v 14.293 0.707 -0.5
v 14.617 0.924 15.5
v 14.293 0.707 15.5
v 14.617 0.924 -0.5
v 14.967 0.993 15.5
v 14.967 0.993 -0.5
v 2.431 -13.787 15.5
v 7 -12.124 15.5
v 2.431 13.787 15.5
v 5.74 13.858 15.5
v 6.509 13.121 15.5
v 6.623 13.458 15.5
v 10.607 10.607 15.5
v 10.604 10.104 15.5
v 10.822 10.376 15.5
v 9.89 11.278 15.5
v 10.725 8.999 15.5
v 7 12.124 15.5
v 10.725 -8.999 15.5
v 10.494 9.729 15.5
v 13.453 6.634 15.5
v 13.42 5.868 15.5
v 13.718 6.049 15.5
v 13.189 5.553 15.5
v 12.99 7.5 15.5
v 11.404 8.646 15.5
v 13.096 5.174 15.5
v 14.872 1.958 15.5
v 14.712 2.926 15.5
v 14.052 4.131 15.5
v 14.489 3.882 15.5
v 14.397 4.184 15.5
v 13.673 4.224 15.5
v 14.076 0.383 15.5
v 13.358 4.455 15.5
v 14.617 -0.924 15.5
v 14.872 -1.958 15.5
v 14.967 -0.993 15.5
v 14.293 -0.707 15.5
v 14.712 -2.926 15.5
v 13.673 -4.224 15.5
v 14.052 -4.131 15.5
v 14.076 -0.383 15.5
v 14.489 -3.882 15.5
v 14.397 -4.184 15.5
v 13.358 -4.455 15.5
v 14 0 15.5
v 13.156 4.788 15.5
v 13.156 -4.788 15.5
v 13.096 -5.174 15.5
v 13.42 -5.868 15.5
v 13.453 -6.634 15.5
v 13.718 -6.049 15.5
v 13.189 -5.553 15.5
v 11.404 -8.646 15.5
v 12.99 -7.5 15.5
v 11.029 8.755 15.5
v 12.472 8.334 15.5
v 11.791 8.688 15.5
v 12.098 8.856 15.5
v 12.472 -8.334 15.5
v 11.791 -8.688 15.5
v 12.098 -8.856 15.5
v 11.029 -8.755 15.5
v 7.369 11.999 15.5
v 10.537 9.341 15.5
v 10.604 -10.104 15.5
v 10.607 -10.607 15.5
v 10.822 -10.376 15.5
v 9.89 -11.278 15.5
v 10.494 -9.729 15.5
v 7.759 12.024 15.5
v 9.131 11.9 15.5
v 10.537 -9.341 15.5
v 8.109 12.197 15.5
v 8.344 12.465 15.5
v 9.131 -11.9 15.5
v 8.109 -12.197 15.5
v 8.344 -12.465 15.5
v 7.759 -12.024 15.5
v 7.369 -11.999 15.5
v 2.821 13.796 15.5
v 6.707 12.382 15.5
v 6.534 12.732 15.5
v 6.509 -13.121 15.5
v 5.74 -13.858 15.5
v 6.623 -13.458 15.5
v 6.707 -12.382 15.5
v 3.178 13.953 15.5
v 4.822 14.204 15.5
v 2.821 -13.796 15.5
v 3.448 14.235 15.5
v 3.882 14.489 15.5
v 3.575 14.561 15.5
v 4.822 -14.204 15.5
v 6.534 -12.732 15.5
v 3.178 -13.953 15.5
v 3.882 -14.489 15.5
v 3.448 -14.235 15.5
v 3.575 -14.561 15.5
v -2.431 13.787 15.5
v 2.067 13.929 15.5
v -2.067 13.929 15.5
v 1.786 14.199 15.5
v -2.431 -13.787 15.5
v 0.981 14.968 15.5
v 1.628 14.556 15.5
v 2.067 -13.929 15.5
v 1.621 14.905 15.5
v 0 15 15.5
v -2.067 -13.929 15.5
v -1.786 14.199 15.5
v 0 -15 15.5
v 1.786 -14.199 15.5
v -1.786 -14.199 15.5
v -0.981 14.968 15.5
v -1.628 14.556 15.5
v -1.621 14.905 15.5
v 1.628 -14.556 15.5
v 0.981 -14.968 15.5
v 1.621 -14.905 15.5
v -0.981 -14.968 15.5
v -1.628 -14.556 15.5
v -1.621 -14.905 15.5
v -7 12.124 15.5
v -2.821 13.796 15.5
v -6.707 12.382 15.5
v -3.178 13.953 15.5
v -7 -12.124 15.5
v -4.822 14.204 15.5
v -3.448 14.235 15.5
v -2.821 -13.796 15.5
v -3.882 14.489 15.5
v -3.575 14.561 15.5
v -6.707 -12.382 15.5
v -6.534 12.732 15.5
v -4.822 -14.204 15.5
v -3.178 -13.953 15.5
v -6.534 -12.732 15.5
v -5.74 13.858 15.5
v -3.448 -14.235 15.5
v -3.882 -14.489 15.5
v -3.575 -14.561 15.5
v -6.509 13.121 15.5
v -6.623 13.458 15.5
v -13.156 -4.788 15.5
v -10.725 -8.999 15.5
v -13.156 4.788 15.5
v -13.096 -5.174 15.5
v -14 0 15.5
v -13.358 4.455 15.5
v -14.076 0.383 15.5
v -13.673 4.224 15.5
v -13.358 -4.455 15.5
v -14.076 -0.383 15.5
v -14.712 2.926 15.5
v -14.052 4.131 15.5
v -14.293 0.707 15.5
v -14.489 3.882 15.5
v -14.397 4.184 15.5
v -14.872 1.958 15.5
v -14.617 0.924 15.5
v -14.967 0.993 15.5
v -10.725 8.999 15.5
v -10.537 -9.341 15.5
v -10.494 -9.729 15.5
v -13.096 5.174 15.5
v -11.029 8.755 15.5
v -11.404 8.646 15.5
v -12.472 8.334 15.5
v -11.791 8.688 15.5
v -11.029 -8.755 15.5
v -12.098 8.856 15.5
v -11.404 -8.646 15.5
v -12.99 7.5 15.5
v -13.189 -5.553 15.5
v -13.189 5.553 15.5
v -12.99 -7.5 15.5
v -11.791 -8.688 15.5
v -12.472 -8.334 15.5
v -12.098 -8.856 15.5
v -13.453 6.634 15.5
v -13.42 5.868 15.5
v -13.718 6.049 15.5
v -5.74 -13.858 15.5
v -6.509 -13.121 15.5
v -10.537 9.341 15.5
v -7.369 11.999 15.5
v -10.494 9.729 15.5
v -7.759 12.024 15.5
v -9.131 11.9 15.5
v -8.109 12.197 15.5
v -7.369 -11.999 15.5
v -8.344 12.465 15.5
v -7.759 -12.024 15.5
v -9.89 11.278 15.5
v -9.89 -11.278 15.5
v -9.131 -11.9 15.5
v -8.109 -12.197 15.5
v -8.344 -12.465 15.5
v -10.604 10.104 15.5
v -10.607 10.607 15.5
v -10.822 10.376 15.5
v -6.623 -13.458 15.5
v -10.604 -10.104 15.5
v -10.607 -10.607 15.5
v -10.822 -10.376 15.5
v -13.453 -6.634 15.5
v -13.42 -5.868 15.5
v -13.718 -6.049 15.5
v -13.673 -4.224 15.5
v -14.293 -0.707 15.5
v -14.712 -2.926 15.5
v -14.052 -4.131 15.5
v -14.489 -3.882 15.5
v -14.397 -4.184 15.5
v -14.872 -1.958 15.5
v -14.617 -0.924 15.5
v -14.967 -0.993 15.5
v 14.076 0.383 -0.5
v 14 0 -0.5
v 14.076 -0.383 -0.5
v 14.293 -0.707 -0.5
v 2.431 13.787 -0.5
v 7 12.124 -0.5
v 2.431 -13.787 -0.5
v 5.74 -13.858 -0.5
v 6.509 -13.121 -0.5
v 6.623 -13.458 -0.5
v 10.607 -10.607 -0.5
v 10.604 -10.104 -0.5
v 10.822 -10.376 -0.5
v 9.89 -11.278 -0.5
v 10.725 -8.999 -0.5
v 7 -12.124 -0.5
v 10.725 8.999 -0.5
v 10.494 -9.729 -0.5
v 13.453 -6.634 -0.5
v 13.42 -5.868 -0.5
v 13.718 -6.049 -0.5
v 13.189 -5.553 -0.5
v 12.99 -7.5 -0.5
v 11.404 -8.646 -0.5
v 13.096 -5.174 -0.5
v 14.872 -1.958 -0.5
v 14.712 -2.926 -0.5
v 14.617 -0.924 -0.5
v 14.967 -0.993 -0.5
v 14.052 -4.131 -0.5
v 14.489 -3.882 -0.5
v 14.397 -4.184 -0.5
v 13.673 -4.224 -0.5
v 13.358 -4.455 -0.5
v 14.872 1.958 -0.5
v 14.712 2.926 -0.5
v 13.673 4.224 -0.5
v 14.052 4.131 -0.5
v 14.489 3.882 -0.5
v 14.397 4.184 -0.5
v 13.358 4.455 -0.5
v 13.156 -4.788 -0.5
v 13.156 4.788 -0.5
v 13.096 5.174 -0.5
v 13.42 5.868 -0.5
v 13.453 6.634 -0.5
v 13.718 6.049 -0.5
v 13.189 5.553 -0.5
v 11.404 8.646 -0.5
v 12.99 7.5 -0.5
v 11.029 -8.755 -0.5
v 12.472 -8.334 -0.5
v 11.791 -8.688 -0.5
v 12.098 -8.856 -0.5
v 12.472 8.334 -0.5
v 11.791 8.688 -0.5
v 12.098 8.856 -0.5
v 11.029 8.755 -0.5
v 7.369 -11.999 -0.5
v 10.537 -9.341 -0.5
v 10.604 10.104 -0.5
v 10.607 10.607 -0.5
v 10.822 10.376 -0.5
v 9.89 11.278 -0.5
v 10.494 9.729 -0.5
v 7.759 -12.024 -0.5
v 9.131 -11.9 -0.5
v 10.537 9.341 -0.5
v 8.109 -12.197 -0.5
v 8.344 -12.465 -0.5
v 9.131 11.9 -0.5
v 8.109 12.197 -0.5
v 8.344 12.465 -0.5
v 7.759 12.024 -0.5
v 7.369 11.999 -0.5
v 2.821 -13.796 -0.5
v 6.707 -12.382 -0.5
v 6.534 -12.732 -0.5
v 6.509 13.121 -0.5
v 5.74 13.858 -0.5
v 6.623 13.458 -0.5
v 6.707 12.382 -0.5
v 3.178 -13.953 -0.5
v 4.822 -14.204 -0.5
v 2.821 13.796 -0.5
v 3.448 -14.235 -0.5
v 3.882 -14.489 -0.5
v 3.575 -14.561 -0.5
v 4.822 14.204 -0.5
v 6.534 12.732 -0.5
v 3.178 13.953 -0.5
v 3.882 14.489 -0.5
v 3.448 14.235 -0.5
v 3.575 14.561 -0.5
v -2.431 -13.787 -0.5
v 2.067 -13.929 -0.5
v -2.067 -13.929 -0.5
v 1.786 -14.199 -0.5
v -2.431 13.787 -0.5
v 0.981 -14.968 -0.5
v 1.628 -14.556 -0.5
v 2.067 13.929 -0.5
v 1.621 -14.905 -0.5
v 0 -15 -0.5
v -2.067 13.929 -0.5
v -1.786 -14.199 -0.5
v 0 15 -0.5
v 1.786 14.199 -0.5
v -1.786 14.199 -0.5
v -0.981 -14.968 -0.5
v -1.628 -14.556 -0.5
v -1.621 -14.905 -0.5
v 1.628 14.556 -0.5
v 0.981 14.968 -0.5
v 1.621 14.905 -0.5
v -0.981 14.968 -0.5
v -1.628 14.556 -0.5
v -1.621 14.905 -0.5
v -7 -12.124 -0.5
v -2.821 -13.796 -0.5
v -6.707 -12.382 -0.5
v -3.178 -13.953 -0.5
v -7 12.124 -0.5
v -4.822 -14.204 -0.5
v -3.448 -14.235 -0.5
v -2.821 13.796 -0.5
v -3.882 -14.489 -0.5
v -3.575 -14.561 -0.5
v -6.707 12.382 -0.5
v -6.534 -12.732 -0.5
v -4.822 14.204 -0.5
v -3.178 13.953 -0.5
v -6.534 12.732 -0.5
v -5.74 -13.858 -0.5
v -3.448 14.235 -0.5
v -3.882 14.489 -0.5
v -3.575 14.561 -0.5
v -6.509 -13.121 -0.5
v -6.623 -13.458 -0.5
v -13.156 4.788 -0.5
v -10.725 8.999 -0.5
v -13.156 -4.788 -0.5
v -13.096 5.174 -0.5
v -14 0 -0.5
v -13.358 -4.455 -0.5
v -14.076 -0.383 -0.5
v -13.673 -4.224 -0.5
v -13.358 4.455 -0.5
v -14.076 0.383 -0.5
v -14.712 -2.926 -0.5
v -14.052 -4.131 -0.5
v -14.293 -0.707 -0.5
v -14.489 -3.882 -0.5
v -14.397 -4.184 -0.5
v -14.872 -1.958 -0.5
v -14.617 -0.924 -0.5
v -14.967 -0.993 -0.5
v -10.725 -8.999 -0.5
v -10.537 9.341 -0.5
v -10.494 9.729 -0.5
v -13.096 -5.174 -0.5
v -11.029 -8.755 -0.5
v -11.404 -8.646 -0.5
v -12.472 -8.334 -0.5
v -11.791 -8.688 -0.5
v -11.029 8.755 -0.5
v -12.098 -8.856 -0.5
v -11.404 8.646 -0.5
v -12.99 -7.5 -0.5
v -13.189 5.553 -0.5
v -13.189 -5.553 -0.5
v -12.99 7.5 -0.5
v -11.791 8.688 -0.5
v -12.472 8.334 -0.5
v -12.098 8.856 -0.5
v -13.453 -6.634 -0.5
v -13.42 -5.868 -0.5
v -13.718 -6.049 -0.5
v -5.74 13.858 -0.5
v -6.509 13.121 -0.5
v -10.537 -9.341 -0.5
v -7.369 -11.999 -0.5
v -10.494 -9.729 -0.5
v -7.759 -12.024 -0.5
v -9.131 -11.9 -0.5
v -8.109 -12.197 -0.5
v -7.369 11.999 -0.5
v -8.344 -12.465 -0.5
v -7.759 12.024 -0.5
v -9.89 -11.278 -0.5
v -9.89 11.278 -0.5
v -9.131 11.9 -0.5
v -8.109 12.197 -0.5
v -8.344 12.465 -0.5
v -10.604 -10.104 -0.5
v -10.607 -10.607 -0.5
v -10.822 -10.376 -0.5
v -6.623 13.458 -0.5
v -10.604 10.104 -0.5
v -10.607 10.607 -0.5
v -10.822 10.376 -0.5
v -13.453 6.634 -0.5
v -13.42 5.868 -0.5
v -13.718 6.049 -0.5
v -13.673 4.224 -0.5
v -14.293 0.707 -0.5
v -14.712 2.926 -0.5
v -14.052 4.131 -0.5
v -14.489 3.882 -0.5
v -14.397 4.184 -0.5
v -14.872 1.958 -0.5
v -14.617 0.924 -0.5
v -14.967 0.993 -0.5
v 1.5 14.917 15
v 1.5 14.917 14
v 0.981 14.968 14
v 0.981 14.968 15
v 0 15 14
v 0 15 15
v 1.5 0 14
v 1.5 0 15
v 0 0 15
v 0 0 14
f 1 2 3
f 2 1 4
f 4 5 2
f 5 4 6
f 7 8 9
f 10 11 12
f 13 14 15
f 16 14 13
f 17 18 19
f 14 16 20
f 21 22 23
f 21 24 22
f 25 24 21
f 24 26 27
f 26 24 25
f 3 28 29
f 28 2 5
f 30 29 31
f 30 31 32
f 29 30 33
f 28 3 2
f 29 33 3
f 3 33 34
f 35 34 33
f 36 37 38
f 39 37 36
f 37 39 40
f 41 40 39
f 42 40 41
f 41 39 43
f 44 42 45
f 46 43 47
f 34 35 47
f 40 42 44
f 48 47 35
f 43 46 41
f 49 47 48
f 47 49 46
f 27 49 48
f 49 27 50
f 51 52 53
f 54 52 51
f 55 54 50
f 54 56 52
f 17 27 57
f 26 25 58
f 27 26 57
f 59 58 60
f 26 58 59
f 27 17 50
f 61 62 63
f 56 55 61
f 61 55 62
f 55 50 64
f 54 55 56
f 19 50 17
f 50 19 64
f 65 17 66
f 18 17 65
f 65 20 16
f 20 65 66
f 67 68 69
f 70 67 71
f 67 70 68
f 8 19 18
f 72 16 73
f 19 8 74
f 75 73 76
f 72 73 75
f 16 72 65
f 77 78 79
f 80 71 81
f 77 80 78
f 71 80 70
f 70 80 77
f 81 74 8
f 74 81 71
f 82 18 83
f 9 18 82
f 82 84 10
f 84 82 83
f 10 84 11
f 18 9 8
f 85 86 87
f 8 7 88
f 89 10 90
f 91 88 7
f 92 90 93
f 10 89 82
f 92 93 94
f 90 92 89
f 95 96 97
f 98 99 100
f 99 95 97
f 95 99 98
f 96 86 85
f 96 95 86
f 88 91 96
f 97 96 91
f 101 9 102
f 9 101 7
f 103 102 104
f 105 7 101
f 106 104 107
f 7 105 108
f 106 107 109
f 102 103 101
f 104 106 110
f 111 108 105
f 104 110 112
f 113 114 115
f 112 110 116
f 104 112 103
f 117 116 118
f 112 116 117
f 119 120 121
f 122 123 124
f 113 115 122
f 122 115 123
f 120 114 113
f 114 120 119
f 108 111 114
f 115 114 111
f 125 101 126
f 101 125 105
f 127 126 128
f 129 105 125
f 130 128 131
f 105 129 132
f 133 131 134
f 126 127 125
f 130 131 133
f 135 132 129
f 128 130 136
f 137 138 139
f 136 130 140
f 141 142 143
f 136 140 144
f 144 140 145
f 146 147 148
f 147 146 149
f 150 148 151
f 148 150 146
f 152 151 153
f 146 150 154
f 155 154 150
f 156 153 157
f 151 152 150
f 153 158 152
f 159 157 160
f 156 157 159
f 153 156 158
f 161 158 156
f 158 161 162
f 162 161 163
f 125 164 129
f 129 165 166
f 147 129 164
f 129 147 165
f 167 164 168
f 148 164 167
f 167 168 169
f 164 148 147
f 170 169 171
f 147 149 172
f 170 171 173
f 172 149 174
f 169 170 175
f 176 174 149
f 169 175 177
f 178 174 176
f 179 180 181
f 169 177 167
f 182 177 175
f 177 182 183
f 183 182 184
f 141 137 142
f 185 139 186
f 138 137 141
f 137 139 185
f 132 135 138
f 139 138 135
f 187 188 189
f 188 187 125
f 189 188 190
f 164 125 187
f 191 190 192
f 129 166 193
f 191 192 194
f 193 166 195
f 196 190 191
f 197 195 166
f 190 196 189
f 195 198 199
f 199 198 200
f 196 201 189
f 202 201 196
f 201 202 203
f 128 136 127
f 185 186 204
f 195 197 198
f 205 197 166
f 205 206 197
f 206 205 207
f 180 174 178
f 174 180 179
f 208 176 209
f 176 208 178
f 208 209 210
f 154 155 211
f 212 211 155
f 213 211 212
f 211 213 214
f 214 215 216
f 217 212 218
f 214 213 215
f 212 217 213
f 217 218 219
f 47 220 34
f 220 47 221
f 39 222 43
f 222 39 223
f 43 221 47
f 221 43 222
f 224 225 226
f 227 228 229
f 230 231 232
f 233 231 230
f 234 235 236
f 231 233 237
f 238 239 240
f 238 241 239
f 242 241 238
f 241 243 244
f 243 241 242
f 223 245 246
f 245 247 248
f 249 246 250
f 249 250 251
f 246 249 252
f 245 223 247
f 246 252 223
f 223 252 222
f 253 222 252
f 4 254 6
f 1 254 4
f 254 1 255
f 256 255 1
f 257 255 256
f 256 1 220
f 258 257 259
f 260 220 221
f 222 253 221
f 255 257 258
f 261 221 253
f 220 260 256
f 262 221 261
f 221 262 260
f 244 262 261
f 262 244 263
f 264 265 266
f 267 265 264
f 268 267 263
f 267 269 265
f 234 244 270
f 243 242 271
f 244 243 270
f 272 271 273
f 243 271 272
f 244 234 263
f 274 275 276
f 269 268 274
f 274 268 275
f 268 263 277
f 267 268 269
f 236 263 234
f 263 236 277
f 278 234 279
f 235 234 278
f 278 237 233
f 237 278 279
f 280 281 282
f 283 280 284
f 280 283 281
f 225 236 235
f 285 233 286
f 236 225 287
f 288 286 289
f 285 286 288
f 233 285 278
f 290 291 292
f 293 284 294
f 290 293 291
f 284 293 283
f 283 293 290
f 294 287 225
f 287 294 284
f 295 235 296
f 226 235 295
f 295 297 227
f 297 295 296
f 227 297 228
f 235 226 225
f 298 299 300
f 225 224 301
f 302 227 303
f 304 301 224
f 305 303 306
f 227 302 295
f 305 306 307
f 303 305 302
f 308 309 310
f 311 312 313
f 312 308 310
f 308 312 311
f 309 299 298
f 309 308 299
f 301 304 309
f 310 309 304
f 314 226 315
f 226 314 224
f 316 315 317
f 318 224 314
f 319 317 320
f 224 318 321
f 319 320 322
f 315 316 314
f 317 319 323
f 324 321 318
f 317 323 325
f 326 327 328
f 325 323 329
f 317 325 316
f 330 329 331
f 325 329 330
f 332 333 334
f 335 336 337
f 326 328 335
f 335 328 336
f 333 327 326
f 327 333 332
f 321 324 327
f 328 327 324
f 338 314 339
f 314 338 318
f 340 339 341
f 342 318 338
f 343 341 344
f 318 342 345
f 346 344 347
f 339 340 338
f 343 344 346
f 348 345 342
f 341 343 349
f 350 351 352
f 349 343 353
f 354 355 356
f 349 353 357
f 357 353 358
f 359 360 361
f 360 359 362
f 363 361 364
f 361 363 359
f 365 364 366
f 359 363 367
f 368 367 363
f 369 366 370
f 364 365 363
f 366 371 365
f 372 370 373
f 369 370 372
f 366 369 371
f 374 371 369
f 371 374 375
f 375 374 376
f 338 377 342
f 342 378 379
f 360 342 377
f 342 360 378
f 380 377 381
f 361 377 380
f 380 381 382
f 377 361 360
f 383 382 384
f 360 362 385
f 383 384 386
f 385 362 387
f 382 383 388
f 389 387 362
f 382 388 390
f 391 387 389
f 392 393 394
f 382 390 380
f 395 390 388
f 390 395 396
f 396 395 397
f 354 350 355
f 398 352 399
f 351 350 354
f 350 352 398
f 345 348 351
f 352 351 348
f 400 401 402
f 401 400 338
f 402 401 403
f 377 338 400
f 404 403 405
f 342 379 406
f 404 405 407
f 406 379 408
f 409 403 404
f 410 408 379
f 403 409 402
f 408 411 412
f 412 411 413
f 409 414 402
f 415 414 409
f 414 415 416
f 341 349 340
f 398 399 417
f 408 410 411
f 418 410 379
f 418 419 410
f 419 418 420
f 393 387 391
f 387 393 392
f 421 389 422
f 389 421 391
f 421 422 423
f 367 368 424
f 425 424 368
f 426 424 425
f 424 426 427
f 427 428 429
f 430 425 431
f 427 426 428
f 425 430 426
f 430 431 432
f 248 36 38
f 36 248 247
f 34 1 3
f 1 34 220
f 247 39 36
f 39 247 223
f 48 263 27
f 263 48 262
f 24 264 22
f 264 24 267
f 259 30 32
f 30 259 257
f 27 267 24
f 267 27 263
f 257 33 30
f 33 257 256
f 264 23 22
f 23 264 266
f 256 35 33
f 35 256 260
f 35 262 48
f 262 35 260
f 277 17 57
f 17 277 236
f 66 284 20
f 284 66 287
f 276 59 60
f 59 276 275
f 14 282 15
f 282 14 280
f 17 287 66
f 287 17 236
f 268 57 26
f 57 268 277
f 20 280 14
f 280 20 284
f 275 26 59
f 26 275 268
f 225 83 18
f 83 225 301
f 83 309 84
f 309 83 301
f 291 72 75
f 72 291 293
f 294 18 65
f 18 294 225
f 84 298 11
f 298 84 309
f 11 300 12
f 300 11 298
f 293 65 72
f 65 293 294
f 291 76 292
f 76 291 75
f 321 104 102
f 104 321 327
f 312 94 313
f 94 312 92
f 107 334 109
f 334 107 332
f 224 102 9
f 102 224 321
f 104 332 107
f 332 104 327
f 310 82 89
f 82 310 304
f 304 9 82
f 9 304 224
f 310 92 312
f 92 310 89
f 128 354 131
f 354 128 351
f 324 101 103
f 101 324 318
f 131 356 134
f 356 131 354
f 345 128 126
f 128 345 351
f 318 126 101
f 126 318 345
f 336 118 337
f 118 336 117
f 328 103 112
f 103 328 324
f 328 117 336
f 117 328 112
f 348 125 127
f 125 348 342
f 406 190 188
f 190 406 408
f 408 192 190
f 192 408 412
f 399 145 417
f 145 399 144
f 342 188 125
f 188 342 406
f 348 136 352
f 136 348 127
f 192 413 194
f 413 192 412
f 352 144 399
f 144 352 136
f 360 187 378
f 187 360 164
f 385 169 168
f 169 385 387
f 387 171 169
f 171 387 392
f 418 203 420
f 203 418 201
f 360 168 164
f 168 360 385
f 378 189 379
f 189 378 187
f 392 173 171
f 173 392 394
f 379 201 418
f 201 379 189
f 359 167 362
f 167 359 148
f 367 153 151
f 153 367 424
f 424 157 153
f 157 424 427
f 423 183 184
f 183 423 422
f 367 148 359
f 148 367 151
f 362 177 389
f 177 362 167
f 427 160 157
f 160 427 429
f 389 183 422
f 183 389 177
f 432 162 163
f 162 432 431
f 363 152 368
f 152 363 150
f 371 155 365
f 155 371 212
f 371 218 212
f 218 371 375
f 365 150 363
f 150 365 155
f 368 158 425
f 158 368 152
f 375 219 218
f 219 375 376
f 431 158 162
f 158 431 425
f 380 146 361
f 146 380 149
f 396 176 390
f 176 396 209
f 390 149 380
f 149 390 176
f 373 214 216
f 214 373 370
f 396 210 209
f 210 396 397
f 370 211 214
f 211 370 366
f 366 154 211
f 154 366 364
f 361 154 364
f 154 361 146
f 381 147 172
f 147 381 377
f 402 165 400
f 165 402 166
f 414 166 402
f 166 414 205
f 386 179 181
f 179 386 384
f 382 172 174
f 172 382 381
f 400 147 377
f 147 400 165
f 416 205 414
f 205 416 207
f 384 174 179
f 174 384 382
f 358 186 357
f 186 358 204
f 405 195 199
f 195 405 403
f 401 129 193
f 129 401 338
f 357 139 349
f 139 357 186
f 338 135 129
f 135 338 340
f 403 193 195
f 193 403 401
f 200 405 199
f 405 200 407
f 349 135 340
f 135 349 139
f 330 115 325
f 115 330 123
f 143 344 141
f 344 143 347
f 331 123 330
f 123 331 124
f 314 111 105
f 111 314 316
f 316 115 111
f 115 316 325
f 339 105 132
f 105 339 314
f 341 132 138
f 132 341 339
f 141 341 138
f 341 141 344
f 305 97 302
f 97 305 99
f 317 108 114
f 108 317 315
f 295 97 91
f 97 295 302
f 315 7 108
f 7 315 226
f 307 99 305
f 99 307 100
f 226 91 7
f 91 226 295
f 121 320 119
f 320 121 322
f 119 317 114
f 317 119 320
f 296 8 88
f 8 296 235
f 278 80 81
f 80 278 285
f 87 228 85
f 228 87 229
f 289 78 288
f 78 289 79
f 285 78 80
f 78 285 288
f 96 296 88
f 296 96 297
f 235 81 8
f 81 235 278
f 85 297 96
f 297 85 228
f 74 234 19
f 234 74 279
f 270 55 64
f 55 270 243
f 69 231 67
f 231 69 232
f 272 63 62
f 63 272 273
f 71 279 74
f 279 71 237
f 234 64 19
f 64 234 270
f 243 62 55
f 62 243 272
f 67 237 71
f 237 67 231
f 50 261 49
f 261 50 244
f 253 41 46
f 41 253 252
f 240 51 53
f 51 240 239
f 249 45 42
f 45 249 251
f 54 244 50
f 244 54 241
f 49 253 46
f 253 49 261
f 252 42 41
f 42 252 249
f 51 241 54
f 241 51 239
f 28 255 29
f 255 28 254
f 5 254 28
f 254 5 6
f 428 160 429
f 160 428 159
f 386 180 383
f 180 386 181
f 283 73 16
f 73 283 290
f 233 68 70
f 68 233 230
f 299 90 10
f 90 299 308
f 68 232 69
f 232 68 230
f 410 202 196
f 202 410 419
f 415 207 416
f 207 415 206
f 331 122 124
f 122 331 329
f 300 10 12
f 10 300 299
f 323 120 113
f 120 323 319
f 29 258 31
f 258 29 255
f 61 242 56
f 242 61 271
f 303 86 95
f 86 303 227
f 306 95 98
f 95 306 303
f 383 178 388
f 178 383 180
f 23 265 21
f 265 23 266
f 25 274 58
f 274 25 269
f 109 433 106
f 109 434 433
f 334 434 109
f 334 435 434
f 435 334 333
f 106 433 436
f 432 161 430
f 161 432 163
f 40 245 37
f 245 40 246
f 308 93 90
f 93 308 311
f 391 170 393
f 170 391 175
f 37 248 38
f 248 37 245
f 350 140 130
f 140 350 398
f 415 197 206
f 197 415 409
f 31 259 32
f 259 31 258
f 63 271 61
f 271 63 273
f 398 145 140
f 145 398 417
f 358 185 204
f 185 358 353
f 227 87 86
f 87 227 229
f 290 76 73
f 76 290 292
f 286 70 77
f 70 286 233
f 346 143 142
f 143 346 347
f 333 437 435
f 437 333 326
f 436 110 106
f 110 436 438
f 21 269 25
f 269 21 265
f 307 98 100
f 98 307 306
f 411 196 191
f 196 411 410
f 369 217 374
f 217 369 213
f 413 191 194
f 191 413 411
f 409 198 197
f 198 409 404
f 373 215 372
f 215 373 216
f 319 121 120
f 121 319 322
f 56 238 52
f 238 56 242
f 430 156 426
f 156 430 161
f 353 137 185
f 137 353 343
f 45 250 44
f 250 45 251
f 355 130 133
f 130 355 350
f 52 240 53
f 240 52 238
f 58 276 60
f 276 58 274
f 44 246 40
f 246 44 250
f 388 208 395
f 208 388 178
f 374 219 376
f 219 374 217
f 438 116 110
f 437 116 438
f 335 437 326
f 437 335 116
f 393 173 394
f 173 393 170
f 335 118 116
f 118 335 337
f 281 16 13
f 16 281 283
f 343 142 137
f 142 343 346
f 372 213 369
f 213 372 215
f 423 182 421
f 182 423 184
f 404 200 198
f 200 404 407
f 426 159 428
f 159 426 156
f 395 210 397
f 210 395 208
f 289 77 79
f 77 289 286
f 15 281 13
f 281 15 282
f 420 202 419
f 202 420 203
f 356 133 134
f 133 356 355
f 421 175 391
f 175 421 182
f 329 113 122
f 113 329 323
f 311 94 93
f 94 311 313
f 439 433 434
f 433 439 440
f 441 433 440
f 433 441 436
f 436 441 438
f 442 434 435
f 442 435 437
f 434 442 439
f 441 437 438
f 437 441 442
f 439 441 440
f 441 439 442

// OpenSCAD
// Replacement knob for a hotplate stirrer with a 6 mm D-shaft
// Print orientation: bottom face (facing the hotplate) on the bed at z = 0

// ---------------- Parameters ----------------
knob_d      = 30;    // knob outer diameter (mm)
knob_h      = 15;    // knob height (mm)

bore_depth  = 12;    // D-bore depth from bottom face (mm)
bore_flat   = 1.5;   // D-bore flat width (mm); circle diameter - flat = 4.7
bore_angle  = 90;    // D-bore symmetry plane angle (deg)

grooves     = 18;    // number of vertical grip grooves
groove_d    = 2;     // groove diameter (mm)

pointer_w   = 1.5;   // pointer groove width (mm)
pointer_d   = 1;     // pointer groove depth (mm)

eps         = 0.5;   // overcut for clean boolean differences (mm)

$fn = 96;            // facet count for round features

// ---------------- Model ----------------
difference() {
    // Main body: cylinder, centred on origin, resting on z = 0
    translate([0, 0, -eps])
        cylinder(d = knob_d, h = knob_h + 2 * eps);

    // D-shaped blind bore from bottom face, extends past top face
    translate([0, 0, -eps])
        rotate([0, 0, bore_angle])
            linear_extrude(height = bore_depth + 2 * eps)
                polygon([
                    [-(bore_flat / 2 + eps), -(bore_flat / 2 + eps)],
                    [-(bore_flat / 2 + eps), (bore_flat / 2 + eps)],
                    [0, -((bore_d() - bore_flat) / 2 + eps)],
                    [0, (bore_d() - bore_flat) / 2 + eps]
                ]);

    // 18 evenly spaced vertical grip grooves along the full height
    for (i = [0 : grooves - 1])
        rotate([0, 0, i * 360 / grooves])
            translate([knob_d / 2, 0, -eps])
                cylinder(d = groove_d, h = knob_h + 2 * eps, $fn = 16);

    // Pointer groove on top face, from centre to outer edge, on flat side
    translate([-(bore_flat / 2 - pointer_w / 2), 0, knob_h - pointer_d])
        cube([pointer_w, knob_d / 2, pointer_d]);
}

// Helper: D-bore circle diameter (6.2 mm per spec)
function bore_d() = 6.2;
